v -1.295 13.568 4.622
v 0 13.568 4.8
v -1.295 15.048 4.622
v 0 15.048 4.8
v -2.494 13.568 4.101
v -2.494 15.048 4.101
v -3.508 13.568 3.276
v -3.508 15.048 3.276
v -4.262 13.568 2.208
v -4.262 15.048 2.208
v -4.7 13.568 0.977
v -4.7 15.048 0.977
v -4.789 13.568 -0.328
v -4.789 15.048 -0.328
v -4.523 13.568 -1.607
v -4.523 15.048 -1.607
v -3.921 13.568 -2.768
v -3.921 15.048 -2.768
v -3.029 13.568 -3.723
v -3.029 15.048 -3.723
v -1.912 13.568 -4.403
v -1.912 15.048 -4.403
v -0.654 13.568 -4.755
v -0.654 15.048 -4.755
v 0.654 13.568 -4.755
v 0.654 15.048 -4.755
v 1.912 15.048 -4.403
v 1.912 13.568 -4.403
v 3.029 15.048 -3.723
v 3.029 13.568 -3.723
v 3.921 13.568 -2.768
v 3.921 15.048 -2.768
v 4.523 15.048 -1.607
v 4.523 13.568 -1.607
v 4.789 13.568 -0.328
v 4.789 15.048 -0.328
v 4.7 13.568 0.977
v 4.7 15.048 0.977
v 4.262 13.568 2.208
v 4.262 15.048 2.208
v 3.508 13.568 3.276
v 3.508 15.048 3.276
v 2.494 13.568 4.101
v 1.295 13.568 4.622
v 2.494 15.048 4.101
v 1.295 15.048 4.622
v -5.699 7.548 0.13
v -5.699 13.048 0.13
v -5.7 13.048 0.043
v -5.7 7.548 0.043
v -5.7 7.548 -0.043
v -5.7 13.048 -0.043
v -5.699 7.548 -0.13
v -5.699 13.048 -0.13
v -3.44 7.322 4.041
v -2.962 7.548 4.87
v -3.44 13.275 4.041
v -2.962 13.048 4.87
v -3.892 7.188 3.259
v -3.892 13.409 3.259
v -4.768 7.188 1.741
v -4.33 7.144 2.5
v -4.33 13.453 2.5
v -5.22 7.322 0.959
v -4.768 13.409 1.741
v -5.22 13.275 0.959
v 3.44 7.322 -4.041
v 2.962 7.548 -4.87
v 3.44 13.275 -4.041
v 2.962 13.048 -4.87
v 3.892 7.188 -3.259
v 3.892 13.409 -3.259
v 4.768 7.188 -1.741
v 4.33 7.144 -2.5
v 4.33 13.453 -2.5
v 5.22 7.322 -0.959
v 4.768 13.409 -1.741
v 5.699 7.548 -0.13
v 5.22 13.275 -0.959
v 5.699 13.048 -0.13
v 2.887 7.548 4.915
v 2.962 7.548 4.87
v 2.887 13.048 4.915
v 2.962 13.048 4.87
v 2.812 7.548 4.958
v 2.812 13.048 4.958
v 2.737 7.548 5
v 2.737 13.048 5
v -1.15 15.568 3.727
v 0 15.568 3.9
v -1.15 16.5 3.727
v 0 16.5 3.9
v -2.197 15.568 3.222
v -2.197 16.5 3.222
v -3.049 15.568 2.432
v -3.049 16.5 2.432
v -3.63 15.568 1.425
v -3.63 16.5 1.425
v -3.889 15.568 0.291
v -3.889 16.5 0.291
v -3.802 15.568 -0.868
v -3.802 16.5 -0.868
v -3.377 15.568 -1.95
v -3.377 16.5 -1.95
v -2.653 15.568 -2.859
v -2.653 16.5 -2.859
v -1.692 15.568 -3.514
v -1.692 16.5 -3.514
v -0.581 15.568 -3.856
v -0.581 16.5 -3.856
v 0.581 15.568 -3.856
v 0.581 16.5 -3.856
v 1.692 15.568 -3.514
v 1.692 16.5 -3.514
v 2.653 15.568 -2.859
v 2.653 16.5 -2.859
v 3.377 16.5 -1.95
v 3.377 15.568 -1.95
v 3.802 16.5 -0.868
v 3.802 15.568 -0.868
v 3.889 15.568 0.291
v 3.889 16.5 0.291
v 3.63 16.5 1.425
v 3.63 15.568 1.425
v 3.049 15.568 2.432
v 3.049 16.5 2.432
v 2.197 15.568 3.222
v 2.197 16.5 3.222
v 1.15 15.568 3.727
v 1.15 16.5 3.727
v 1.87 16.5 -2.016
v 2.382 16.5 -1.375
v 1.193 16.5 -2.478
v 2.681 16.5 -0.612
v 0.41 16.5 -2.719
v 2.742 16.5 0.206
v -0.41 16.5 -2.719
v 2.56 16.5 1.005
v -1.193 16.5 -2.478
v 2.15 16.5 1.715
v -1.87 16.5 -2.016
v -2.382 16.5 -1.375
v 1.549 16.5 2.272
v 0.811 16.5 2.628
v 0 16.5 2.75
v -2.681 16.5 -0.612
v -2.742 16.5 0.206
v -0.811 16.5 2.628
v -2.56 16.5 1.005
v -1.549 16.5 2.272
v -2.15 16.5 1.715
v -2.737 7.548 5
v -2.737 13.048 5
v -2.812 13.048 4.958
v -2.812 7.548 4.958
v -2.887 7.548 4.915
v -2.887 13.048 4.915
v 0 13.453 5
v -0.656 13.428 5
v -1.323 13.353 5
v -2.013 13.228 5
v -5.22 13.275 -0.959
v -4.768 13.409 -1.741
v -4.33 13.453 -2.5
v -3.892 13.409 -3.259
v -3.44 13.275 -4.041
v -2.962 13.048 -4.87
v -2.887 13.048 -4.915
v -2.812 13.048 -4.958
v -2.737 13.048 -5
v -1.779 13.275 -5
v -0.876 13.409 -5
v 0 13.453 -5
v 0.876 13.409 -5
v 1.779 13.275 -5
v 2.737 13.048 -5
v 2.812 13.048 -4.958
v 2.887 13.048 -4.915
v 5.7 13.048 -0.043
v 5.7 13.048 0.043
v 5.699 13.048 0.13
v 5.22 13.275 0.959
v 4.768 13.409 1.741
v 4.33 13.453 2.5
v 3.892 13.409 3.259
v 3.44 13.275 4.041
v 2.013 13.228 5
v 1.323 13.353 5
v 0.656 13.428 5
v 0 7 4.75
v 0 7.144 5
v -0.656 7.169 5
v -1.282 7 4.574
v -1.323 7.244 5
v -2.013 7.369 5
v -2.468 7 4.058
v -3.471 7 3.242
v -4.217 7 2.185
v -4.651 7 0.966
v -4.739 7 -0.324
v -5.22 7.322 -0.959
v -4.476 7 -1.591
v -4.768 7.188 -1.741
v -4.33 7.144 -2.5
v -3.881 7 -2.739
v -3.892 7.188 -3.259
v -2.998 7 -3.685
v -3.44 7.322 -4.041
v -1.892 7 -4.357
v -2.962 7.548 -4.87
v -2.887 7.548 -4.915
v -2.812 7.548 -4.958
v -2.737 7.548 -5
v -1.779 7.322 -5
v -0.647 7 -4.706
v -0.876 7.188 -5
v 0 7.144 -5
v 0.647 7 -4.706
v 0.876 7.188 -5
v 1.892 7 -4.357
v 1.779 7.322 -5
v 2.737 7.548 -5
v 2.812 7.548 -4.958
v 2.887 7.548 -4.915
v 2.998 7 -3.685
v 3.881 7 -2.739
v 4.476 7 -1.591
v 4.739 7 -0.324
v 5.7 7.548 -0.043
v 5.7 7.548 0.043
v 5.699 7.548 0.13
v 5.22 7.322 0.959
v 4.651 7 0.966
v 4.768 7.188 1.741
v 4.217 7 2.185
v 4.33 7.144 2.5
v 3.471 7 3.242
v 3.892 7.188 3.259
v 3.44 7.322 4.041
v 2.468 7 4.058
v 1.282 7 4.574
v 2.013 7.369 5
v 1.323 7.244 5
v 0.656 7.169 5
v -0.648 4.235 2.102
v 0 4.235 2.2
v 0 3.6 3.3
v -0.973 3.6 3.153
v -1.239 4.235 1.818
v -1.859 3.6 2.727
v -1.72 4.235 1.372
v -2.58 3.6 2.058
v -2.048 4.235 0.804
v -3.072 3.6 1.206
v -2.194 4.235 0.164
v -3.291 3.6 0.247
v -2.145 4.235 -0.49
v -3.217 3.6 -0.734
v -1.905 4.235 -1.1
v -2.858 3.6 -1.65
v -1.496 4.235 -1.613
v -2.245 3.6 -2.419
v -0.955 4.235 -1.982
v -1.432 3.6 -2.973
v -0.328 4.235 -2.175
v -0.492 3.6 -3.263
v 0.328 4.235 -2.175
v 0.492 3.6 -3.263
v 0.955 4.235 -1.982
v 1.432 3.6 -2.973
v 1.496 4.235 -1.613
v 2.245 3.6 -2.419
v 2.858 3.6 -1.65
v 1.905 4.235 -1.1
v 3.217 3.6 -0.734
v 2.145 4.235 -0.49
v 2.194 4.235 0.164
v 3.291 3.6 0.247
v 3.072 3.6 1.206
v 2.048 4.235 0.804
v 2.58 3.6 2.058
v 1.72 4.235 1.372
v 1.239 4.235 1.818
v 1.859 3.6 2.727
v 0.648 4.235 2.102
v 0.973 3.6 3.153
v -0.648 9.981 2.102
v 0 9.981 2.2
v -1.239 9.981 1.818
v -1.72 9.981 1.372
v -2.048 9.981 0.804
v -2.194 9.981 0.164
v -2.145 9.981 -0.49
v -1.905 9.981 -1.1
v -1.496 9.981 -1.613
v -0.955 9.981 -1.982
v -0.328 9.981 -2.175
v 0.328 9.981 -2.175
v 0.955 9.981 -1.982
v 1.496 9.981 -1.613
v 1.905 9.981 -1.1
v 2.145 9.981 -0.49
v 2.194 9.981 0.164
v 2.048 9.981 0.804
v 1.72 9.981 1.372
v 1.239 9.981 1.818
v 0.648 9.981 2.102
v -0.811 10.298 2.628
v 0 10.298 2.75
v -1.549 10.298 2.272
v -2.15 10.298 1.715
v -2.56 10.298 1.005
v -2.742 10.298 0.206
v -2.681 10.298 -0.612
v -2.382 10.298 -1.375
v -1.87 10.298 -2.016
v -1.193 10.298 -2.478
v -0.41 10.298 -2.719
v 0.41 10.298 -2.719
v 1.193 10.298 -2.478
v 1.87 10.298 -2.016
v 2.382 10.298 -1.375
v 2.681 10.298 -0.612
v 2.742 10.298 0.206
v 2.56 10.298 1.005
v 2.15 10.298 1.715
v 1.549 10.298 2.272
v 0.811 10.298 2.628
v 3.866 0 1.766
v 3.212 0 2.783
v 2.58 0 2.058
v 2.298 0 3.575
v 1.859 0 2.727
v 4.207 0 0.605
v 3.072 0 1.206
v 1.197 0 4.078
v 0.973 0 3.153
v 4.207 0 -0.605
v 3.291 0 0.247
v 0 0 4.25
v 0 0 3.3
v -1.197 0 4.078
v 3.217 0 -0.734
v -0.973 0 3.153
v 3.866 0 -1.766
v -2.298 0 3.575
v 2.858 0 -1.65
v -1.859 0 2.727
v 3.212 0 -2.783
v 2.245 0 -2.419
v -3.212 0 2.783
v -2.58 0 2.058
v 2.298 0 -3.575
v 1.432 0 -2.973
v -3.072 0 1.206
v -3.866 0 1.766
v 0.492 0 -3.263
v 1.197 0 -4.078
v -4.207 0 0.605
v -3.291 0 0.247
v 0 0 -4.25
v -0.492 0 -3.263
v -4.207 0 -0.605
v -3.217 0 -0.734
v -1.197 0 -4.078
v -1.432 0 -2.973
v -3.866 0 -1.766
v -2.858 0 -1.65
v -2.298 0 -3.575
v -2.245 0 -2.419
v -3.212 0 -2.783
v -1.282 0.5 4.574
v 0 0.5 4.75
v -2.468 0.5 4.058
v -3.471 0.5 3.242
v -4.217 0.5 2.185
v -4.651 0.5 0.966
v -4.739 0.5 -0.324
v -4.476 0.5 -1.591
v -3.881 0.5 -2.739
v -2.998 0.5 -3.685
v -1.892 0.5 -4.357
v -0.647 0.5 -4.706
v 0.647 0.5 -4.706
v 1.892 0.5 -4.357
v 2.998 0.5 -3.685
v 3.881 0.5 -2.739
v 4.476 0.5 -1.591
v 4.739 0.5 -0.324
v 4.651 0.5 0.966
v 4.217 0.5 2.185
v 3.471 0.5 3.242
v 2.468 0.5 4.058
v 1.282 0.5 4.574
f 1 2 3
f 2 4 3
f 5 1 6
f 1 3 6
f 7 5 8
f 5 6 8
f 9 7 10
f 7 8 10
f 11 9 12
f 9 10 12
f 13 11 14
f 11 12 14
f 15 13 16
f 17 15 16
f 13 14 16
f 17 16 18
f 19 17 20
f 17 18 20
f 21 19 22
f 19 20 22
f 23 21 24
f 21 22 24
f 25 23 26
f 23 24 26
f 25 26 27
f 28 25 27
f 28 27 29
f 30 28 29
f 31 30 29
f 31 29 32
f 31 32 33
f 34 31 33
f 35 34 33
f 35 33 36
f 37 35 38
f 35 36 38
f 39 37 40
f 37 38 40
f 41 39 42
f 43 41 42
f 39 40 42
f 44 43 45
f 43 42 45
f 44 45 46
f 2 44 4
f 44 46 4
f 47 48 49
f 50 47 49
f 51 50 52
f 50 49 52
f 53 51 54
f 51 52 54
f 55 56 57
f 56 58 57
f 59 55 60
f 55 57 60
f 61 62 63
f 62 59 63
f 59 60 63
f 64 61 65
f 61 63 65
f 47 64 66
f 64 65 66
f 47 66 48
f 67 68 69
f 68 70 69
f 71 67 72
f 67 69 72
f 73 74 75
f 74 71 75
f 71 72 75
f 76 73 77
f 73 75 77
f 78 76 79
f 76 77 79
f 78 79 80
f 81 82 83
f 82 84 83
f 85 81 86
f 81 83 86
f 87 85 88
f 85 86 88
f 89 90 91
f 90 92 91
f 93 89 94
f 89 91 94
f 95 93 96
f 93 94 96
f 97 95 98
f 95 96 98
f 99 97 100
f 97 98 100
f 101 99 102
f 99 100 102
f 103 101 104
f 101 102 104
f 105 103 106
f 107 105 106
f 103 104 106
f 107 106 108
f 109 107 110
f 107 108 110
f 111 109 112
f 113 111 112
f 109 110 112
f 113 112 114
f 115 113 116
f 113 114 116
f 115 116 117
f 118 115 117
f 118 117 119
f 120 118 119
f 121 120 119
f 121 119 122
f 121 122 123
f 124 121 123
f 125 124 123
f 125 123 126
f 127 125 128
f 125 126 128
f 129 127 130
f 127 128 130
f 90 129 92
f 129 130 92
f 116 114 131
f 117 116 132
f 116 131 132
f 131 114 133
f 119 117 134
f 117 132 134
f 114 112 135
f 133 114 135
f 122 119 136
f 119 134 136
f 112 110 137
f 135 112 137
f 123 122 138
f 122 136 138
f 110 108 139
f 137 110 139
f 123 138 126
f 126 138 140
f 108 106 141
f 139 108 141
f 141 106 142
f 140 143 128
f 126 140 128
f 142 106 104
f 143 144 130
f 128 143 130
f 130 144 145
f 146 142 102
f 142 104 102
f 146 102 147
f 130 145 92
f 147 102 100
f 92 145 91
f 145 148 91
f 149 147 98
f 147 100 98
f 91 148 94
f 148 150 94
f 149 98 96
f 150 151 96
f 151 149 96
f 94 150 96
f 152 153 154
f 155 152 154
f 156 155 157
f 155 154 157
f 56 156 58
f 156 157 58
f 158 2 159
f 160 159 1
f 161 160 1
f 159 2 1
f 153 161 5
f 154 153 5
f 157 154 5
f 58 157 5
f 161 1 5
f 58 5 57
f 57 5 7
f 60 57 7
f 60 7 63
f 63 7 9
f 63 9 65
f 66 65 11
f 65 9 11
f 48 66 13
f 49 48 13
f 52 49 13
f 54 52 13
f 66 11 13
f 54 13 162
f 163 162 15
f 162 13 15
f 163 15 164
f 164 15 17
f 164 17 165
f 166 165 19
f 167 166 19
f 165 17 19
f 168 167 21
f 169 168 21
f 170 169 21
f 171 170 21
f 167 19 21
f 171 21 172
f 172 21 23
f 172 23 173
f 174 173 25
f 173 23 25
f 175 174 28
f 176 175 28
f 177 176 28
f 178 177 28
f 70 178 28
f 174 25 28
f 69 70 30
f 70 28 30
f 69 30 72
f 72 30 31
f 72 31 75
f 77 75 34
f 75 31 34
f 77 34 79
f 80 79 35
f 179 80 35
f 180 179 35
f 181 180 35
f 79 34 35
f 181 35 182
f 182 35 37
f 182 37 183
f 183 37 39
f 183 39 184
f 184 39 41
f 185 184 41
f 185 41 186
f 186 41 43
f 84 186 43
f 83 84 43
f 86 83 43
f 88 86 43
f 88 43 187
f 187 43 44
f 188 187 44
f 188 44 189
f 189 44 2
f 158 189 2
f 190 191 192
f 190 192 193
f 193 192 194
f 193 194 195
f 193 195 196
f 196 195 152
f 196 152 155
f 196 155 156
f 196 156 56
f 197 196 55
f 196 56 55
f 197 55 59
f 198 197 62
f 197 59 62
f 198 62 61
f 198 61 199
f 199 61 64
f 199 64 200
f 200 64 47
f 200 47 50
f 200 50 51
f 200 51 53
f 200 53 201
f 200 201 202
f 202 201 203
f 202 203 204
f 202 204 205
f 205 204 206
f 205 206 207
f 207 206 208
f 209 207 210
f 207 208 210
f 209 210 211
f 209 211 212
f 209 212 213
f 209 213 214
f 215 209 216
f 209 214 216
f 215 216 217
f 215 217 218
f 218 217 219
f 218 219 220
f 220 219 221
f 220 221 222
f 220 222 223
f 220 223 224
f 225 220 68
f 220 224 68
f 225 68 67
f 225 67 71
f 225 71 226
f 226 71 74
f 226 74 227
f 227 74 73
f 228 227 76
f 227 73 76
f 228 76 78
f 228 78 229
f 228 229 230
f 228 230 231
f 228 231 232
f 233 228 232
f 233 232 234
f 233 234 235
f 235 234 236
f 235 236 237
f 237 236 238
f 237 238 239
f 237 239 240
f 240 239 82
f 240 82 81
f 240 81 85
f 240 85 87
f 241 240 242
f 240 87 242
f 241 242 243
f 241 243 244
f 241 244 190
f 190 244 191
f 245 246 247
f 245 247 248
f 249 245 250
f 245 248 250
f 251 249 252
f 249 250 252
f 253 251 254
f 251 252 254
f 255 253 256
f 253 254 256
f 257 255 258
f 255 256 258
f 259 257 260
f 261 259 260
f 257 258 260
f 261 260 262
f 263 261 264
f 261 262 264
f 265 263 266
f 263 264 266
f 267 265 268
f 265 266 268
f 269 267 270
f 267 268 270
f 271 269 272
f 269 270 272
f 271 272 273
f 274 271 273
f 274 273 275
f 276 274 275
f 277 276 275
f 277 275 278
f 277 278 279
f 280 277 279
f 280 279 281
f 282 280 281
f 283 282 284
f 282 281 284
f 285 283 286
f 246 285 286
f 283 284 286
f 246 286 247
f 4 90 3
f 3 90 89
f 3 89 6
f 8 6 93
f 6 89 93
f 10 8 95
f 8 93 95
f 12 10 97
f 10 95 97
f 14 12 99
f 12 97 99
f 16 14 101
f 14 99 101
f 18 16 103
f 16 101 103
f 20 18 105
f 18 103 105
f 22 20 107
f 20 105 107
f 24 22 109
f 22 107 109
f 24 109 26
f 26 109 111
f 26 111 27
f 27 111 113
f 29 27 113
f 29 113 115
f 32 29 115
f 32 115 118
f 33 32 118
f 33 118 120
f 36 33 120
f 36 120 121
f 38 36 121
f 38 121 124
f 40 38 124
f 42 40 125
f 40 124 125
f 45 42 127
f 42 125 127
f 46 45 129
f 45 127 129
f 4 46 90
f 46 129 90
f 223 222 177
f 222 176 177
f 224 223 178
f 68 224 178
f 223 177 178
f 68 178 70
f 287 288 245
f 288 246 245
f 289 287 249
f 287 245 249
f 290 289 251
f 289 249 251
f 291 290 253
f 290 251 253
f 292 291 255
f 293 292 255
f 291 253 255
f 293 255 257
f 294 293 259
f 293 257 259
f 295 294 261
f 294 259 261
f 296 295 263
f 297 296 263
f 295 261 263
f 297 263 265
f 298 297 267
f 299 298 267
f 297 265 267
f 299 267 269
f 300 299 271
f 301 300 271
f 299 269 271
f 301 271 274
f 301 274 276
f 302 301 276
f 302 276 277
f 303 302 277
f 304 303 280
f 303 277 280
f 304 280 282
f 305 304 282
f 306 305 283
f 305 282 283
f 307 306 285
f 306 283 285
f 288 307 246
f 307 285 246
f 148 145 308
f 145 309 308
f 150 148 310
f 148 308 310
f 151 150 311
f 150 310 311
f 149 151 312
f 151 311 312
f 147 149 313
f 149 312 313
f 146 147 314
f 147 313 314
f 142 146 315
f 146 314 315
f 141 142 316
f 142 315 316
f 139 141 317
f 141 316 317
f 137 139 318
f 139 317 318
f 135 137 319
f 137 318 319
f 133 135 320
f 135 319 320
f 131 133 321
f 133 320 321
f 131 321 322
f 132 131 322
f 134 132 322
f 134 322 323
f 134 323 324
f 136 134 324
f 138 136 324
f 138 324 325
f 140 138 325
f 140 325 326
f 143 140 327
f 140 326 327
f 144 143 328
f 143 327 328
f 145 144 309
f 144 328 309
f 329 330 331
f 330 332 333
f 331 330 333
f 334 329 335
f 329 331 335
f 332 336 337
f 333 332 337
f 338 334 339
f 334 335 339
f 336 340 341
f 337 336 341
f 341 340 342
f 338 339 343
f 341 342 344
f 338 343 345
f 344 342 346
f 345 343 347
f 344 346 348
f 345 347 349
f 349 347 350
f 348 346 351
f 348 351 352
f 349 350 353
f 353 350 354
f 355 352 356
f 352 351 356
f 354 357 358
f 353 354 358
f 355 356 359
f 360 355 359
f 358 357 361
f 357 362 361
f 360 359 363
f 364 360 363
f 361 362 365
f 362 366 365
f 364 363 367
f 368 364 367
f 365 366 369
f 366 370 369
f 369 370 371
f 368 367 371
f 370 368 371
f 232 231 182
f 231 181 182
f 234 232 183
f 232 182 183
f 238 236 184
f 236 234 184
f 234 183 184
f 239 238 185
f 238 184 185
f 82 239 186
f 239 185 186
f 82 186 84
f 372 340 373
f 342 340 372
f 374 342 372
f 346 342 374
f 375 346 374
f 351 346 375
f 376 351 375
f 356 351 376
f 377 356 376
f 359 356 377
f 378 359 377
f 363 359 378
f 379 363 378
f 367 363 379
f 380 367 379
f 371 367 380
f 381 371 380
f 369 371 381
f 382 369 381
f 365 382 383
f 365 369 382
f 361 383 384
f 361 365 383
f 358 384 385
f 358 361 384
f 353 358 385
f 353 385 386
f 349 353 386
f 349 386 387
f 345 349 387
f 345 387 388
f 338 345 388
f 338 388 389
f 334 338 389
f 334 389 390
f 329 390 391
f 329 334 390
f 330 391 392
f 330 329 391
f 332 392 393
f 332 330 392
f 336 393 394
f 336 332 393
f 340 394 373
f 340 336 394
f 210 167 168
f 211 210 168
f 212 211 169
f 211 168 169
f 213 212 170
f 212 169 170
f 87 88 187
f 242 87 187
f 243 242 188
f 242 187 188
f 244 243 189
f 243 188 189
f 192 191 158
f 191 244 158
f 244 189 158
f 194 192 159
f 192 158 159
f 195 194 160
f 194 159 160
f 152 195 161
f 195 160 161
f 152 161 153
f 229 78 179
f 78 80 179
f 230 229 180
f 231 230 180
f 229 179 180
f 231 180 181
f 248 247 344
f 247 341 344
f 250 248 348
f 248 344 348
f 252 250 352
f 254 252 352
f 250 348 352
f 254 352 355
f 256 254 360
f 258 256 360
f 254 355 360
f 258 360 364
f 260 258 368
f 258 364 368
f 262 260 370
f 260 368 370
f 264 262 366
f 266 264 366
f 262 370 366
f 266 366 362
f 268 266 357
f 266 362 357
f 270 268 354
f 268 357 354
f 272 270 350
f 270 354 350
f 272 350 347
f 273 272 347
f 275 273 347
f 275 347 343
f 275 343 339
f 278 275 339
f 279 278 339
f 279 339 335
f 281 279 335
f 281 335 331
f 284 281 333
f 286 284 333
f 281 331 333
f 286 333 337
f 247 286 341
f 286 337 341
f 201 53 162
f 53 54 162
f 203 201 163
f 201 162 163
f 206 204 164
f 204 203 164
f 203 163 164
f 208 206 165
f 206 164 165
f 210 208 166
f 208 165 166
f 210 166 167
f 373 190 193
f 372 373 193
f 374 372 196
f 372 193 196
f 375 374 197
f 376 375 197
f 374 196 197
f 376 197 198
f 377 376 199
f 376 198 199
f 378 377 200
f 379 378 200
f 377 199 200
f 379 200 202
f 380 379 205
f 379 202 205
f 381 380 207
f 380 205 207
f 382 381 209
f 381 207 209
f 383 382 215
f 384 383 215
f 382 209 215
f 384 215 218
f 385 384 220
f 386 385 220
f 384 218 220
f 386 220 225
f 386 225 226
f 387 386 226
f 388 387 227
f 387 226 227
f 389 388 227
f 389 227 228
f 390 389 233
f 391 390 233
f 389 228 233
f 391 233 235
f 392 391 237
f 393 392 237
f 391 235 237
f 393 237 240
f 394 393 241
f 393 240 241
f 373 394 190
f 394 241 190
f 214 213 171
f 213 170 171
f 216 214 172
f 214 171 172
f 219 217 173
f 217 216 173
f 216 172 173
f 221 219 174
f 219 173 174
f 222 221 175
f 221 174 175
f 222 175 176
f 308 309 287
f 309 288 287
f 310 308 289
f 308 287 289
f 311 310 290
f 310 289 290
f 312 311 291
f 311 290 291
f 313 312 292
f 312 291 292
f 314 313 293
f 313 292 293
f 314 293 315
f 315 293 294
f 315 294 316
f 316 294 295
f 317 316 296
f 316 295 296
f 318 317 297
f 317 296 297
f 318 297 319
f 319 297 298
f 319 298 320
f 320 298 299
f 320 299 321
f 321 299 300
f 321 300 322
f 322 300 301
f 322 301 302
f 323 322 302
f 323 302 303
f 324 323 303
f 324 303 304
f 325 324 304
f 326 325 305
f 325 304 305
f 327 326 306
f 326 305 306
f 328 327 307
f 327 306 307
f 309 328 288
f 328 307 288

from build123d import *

# Parameters (mm, degrees)
CUT_EXTRUDE1_DEPTH = 19.363823131
CHAMFER1_SIZE      = 0.5


with BuildPart() as part:
    # Sketch1 → Revolve1 (revolve)
    with BuildSketch(Plane(origin=(0, 0, 0), x_dir=(0, 0, -1), z_dir=(1, 0, 0)), mode=Mode.PRIVATE) as revolve1_sk:
        Polygon((4.75, 0), (4.75, 7), (5.7, 7.548482756), (5.7, 13.048482756), (4.8, 13.568097998), (4.8, 15.048482756), (3.9, 15.568097998), (3.9, 16.5), (2.75, 16.5), (2.75, 10.298482756), (2.2, 9.980940108), (2.2, 4.235085296), (3.3, 3.6), (3.3, 0), align=None)
    revolve(revolve1_sk.sketch.rotate(Axis((0, 19.630565864, 0), (0, -1, 0)), 180), axis=Axis((0, 19.630565864, 0), (0, -1, 0)))

    # Sketch2 → Cut-Extrude1 (cut, through all)
    with BuildSketch(Plane(origin=(0, 16.5, 0), x_dir=(1, 0, 0), z_dir=(0, 1, 0))):
        with BuildLine():
            Line((-2.886751346, 5), (2.886751346, 5))
            ThreePointArc((2.886751346, 5), (0, 5.773502692), (-2.886751346, 5))
        make_face()
        with BuildLine():
            Line((-5.773502692, 0), (-2.886751346, 5))
            ThreePointArc((-2.886751346, 5), (-5, 2.886751346), (-5.773502692, 0))
        make_face()
        with BuildLine():
            Line((-2.886751346, -5), (-5.773502692, 0))
            ThreePointArc((-5.773502692, 0), (-5, -2.886751346), (-2.886751346, -5))
        make_face()
        with BuildLine():
            ThreePointArc((-2.886751346, -5), (0, -5.773502692), (2.886751346, -5))
            Line((2.886751346, -5), (-2.886751346, -5))
        make_face()
        with BuildLine():
            ThreePointArc((2.886751346, -5), (5, -2.886751346), (5.773502692, 0))
            Line((5.773502692, 0), (2.886751346, -5))
        make_face()
        with BuildLine():
            ThreePointArc((5.773502692, 0), (5, 2.886751346), (2.886751346, 5))
            Line((2.886751346, 5), (5.773502692, 0))
        make_face()
    extrude(amount=-CUT_EXTRUDE1_DEPTH, mode=Mode.SUBTRACT)

    # Chamfer1
    chamfer1_edges = [part.edges().sort_by_distance(p)[0] for p in [
        (0, 0, -4.75),
    ]]
    chamfer(chamfer1_edges, length=CHAMFER1_SIZE)


solid = part.part
